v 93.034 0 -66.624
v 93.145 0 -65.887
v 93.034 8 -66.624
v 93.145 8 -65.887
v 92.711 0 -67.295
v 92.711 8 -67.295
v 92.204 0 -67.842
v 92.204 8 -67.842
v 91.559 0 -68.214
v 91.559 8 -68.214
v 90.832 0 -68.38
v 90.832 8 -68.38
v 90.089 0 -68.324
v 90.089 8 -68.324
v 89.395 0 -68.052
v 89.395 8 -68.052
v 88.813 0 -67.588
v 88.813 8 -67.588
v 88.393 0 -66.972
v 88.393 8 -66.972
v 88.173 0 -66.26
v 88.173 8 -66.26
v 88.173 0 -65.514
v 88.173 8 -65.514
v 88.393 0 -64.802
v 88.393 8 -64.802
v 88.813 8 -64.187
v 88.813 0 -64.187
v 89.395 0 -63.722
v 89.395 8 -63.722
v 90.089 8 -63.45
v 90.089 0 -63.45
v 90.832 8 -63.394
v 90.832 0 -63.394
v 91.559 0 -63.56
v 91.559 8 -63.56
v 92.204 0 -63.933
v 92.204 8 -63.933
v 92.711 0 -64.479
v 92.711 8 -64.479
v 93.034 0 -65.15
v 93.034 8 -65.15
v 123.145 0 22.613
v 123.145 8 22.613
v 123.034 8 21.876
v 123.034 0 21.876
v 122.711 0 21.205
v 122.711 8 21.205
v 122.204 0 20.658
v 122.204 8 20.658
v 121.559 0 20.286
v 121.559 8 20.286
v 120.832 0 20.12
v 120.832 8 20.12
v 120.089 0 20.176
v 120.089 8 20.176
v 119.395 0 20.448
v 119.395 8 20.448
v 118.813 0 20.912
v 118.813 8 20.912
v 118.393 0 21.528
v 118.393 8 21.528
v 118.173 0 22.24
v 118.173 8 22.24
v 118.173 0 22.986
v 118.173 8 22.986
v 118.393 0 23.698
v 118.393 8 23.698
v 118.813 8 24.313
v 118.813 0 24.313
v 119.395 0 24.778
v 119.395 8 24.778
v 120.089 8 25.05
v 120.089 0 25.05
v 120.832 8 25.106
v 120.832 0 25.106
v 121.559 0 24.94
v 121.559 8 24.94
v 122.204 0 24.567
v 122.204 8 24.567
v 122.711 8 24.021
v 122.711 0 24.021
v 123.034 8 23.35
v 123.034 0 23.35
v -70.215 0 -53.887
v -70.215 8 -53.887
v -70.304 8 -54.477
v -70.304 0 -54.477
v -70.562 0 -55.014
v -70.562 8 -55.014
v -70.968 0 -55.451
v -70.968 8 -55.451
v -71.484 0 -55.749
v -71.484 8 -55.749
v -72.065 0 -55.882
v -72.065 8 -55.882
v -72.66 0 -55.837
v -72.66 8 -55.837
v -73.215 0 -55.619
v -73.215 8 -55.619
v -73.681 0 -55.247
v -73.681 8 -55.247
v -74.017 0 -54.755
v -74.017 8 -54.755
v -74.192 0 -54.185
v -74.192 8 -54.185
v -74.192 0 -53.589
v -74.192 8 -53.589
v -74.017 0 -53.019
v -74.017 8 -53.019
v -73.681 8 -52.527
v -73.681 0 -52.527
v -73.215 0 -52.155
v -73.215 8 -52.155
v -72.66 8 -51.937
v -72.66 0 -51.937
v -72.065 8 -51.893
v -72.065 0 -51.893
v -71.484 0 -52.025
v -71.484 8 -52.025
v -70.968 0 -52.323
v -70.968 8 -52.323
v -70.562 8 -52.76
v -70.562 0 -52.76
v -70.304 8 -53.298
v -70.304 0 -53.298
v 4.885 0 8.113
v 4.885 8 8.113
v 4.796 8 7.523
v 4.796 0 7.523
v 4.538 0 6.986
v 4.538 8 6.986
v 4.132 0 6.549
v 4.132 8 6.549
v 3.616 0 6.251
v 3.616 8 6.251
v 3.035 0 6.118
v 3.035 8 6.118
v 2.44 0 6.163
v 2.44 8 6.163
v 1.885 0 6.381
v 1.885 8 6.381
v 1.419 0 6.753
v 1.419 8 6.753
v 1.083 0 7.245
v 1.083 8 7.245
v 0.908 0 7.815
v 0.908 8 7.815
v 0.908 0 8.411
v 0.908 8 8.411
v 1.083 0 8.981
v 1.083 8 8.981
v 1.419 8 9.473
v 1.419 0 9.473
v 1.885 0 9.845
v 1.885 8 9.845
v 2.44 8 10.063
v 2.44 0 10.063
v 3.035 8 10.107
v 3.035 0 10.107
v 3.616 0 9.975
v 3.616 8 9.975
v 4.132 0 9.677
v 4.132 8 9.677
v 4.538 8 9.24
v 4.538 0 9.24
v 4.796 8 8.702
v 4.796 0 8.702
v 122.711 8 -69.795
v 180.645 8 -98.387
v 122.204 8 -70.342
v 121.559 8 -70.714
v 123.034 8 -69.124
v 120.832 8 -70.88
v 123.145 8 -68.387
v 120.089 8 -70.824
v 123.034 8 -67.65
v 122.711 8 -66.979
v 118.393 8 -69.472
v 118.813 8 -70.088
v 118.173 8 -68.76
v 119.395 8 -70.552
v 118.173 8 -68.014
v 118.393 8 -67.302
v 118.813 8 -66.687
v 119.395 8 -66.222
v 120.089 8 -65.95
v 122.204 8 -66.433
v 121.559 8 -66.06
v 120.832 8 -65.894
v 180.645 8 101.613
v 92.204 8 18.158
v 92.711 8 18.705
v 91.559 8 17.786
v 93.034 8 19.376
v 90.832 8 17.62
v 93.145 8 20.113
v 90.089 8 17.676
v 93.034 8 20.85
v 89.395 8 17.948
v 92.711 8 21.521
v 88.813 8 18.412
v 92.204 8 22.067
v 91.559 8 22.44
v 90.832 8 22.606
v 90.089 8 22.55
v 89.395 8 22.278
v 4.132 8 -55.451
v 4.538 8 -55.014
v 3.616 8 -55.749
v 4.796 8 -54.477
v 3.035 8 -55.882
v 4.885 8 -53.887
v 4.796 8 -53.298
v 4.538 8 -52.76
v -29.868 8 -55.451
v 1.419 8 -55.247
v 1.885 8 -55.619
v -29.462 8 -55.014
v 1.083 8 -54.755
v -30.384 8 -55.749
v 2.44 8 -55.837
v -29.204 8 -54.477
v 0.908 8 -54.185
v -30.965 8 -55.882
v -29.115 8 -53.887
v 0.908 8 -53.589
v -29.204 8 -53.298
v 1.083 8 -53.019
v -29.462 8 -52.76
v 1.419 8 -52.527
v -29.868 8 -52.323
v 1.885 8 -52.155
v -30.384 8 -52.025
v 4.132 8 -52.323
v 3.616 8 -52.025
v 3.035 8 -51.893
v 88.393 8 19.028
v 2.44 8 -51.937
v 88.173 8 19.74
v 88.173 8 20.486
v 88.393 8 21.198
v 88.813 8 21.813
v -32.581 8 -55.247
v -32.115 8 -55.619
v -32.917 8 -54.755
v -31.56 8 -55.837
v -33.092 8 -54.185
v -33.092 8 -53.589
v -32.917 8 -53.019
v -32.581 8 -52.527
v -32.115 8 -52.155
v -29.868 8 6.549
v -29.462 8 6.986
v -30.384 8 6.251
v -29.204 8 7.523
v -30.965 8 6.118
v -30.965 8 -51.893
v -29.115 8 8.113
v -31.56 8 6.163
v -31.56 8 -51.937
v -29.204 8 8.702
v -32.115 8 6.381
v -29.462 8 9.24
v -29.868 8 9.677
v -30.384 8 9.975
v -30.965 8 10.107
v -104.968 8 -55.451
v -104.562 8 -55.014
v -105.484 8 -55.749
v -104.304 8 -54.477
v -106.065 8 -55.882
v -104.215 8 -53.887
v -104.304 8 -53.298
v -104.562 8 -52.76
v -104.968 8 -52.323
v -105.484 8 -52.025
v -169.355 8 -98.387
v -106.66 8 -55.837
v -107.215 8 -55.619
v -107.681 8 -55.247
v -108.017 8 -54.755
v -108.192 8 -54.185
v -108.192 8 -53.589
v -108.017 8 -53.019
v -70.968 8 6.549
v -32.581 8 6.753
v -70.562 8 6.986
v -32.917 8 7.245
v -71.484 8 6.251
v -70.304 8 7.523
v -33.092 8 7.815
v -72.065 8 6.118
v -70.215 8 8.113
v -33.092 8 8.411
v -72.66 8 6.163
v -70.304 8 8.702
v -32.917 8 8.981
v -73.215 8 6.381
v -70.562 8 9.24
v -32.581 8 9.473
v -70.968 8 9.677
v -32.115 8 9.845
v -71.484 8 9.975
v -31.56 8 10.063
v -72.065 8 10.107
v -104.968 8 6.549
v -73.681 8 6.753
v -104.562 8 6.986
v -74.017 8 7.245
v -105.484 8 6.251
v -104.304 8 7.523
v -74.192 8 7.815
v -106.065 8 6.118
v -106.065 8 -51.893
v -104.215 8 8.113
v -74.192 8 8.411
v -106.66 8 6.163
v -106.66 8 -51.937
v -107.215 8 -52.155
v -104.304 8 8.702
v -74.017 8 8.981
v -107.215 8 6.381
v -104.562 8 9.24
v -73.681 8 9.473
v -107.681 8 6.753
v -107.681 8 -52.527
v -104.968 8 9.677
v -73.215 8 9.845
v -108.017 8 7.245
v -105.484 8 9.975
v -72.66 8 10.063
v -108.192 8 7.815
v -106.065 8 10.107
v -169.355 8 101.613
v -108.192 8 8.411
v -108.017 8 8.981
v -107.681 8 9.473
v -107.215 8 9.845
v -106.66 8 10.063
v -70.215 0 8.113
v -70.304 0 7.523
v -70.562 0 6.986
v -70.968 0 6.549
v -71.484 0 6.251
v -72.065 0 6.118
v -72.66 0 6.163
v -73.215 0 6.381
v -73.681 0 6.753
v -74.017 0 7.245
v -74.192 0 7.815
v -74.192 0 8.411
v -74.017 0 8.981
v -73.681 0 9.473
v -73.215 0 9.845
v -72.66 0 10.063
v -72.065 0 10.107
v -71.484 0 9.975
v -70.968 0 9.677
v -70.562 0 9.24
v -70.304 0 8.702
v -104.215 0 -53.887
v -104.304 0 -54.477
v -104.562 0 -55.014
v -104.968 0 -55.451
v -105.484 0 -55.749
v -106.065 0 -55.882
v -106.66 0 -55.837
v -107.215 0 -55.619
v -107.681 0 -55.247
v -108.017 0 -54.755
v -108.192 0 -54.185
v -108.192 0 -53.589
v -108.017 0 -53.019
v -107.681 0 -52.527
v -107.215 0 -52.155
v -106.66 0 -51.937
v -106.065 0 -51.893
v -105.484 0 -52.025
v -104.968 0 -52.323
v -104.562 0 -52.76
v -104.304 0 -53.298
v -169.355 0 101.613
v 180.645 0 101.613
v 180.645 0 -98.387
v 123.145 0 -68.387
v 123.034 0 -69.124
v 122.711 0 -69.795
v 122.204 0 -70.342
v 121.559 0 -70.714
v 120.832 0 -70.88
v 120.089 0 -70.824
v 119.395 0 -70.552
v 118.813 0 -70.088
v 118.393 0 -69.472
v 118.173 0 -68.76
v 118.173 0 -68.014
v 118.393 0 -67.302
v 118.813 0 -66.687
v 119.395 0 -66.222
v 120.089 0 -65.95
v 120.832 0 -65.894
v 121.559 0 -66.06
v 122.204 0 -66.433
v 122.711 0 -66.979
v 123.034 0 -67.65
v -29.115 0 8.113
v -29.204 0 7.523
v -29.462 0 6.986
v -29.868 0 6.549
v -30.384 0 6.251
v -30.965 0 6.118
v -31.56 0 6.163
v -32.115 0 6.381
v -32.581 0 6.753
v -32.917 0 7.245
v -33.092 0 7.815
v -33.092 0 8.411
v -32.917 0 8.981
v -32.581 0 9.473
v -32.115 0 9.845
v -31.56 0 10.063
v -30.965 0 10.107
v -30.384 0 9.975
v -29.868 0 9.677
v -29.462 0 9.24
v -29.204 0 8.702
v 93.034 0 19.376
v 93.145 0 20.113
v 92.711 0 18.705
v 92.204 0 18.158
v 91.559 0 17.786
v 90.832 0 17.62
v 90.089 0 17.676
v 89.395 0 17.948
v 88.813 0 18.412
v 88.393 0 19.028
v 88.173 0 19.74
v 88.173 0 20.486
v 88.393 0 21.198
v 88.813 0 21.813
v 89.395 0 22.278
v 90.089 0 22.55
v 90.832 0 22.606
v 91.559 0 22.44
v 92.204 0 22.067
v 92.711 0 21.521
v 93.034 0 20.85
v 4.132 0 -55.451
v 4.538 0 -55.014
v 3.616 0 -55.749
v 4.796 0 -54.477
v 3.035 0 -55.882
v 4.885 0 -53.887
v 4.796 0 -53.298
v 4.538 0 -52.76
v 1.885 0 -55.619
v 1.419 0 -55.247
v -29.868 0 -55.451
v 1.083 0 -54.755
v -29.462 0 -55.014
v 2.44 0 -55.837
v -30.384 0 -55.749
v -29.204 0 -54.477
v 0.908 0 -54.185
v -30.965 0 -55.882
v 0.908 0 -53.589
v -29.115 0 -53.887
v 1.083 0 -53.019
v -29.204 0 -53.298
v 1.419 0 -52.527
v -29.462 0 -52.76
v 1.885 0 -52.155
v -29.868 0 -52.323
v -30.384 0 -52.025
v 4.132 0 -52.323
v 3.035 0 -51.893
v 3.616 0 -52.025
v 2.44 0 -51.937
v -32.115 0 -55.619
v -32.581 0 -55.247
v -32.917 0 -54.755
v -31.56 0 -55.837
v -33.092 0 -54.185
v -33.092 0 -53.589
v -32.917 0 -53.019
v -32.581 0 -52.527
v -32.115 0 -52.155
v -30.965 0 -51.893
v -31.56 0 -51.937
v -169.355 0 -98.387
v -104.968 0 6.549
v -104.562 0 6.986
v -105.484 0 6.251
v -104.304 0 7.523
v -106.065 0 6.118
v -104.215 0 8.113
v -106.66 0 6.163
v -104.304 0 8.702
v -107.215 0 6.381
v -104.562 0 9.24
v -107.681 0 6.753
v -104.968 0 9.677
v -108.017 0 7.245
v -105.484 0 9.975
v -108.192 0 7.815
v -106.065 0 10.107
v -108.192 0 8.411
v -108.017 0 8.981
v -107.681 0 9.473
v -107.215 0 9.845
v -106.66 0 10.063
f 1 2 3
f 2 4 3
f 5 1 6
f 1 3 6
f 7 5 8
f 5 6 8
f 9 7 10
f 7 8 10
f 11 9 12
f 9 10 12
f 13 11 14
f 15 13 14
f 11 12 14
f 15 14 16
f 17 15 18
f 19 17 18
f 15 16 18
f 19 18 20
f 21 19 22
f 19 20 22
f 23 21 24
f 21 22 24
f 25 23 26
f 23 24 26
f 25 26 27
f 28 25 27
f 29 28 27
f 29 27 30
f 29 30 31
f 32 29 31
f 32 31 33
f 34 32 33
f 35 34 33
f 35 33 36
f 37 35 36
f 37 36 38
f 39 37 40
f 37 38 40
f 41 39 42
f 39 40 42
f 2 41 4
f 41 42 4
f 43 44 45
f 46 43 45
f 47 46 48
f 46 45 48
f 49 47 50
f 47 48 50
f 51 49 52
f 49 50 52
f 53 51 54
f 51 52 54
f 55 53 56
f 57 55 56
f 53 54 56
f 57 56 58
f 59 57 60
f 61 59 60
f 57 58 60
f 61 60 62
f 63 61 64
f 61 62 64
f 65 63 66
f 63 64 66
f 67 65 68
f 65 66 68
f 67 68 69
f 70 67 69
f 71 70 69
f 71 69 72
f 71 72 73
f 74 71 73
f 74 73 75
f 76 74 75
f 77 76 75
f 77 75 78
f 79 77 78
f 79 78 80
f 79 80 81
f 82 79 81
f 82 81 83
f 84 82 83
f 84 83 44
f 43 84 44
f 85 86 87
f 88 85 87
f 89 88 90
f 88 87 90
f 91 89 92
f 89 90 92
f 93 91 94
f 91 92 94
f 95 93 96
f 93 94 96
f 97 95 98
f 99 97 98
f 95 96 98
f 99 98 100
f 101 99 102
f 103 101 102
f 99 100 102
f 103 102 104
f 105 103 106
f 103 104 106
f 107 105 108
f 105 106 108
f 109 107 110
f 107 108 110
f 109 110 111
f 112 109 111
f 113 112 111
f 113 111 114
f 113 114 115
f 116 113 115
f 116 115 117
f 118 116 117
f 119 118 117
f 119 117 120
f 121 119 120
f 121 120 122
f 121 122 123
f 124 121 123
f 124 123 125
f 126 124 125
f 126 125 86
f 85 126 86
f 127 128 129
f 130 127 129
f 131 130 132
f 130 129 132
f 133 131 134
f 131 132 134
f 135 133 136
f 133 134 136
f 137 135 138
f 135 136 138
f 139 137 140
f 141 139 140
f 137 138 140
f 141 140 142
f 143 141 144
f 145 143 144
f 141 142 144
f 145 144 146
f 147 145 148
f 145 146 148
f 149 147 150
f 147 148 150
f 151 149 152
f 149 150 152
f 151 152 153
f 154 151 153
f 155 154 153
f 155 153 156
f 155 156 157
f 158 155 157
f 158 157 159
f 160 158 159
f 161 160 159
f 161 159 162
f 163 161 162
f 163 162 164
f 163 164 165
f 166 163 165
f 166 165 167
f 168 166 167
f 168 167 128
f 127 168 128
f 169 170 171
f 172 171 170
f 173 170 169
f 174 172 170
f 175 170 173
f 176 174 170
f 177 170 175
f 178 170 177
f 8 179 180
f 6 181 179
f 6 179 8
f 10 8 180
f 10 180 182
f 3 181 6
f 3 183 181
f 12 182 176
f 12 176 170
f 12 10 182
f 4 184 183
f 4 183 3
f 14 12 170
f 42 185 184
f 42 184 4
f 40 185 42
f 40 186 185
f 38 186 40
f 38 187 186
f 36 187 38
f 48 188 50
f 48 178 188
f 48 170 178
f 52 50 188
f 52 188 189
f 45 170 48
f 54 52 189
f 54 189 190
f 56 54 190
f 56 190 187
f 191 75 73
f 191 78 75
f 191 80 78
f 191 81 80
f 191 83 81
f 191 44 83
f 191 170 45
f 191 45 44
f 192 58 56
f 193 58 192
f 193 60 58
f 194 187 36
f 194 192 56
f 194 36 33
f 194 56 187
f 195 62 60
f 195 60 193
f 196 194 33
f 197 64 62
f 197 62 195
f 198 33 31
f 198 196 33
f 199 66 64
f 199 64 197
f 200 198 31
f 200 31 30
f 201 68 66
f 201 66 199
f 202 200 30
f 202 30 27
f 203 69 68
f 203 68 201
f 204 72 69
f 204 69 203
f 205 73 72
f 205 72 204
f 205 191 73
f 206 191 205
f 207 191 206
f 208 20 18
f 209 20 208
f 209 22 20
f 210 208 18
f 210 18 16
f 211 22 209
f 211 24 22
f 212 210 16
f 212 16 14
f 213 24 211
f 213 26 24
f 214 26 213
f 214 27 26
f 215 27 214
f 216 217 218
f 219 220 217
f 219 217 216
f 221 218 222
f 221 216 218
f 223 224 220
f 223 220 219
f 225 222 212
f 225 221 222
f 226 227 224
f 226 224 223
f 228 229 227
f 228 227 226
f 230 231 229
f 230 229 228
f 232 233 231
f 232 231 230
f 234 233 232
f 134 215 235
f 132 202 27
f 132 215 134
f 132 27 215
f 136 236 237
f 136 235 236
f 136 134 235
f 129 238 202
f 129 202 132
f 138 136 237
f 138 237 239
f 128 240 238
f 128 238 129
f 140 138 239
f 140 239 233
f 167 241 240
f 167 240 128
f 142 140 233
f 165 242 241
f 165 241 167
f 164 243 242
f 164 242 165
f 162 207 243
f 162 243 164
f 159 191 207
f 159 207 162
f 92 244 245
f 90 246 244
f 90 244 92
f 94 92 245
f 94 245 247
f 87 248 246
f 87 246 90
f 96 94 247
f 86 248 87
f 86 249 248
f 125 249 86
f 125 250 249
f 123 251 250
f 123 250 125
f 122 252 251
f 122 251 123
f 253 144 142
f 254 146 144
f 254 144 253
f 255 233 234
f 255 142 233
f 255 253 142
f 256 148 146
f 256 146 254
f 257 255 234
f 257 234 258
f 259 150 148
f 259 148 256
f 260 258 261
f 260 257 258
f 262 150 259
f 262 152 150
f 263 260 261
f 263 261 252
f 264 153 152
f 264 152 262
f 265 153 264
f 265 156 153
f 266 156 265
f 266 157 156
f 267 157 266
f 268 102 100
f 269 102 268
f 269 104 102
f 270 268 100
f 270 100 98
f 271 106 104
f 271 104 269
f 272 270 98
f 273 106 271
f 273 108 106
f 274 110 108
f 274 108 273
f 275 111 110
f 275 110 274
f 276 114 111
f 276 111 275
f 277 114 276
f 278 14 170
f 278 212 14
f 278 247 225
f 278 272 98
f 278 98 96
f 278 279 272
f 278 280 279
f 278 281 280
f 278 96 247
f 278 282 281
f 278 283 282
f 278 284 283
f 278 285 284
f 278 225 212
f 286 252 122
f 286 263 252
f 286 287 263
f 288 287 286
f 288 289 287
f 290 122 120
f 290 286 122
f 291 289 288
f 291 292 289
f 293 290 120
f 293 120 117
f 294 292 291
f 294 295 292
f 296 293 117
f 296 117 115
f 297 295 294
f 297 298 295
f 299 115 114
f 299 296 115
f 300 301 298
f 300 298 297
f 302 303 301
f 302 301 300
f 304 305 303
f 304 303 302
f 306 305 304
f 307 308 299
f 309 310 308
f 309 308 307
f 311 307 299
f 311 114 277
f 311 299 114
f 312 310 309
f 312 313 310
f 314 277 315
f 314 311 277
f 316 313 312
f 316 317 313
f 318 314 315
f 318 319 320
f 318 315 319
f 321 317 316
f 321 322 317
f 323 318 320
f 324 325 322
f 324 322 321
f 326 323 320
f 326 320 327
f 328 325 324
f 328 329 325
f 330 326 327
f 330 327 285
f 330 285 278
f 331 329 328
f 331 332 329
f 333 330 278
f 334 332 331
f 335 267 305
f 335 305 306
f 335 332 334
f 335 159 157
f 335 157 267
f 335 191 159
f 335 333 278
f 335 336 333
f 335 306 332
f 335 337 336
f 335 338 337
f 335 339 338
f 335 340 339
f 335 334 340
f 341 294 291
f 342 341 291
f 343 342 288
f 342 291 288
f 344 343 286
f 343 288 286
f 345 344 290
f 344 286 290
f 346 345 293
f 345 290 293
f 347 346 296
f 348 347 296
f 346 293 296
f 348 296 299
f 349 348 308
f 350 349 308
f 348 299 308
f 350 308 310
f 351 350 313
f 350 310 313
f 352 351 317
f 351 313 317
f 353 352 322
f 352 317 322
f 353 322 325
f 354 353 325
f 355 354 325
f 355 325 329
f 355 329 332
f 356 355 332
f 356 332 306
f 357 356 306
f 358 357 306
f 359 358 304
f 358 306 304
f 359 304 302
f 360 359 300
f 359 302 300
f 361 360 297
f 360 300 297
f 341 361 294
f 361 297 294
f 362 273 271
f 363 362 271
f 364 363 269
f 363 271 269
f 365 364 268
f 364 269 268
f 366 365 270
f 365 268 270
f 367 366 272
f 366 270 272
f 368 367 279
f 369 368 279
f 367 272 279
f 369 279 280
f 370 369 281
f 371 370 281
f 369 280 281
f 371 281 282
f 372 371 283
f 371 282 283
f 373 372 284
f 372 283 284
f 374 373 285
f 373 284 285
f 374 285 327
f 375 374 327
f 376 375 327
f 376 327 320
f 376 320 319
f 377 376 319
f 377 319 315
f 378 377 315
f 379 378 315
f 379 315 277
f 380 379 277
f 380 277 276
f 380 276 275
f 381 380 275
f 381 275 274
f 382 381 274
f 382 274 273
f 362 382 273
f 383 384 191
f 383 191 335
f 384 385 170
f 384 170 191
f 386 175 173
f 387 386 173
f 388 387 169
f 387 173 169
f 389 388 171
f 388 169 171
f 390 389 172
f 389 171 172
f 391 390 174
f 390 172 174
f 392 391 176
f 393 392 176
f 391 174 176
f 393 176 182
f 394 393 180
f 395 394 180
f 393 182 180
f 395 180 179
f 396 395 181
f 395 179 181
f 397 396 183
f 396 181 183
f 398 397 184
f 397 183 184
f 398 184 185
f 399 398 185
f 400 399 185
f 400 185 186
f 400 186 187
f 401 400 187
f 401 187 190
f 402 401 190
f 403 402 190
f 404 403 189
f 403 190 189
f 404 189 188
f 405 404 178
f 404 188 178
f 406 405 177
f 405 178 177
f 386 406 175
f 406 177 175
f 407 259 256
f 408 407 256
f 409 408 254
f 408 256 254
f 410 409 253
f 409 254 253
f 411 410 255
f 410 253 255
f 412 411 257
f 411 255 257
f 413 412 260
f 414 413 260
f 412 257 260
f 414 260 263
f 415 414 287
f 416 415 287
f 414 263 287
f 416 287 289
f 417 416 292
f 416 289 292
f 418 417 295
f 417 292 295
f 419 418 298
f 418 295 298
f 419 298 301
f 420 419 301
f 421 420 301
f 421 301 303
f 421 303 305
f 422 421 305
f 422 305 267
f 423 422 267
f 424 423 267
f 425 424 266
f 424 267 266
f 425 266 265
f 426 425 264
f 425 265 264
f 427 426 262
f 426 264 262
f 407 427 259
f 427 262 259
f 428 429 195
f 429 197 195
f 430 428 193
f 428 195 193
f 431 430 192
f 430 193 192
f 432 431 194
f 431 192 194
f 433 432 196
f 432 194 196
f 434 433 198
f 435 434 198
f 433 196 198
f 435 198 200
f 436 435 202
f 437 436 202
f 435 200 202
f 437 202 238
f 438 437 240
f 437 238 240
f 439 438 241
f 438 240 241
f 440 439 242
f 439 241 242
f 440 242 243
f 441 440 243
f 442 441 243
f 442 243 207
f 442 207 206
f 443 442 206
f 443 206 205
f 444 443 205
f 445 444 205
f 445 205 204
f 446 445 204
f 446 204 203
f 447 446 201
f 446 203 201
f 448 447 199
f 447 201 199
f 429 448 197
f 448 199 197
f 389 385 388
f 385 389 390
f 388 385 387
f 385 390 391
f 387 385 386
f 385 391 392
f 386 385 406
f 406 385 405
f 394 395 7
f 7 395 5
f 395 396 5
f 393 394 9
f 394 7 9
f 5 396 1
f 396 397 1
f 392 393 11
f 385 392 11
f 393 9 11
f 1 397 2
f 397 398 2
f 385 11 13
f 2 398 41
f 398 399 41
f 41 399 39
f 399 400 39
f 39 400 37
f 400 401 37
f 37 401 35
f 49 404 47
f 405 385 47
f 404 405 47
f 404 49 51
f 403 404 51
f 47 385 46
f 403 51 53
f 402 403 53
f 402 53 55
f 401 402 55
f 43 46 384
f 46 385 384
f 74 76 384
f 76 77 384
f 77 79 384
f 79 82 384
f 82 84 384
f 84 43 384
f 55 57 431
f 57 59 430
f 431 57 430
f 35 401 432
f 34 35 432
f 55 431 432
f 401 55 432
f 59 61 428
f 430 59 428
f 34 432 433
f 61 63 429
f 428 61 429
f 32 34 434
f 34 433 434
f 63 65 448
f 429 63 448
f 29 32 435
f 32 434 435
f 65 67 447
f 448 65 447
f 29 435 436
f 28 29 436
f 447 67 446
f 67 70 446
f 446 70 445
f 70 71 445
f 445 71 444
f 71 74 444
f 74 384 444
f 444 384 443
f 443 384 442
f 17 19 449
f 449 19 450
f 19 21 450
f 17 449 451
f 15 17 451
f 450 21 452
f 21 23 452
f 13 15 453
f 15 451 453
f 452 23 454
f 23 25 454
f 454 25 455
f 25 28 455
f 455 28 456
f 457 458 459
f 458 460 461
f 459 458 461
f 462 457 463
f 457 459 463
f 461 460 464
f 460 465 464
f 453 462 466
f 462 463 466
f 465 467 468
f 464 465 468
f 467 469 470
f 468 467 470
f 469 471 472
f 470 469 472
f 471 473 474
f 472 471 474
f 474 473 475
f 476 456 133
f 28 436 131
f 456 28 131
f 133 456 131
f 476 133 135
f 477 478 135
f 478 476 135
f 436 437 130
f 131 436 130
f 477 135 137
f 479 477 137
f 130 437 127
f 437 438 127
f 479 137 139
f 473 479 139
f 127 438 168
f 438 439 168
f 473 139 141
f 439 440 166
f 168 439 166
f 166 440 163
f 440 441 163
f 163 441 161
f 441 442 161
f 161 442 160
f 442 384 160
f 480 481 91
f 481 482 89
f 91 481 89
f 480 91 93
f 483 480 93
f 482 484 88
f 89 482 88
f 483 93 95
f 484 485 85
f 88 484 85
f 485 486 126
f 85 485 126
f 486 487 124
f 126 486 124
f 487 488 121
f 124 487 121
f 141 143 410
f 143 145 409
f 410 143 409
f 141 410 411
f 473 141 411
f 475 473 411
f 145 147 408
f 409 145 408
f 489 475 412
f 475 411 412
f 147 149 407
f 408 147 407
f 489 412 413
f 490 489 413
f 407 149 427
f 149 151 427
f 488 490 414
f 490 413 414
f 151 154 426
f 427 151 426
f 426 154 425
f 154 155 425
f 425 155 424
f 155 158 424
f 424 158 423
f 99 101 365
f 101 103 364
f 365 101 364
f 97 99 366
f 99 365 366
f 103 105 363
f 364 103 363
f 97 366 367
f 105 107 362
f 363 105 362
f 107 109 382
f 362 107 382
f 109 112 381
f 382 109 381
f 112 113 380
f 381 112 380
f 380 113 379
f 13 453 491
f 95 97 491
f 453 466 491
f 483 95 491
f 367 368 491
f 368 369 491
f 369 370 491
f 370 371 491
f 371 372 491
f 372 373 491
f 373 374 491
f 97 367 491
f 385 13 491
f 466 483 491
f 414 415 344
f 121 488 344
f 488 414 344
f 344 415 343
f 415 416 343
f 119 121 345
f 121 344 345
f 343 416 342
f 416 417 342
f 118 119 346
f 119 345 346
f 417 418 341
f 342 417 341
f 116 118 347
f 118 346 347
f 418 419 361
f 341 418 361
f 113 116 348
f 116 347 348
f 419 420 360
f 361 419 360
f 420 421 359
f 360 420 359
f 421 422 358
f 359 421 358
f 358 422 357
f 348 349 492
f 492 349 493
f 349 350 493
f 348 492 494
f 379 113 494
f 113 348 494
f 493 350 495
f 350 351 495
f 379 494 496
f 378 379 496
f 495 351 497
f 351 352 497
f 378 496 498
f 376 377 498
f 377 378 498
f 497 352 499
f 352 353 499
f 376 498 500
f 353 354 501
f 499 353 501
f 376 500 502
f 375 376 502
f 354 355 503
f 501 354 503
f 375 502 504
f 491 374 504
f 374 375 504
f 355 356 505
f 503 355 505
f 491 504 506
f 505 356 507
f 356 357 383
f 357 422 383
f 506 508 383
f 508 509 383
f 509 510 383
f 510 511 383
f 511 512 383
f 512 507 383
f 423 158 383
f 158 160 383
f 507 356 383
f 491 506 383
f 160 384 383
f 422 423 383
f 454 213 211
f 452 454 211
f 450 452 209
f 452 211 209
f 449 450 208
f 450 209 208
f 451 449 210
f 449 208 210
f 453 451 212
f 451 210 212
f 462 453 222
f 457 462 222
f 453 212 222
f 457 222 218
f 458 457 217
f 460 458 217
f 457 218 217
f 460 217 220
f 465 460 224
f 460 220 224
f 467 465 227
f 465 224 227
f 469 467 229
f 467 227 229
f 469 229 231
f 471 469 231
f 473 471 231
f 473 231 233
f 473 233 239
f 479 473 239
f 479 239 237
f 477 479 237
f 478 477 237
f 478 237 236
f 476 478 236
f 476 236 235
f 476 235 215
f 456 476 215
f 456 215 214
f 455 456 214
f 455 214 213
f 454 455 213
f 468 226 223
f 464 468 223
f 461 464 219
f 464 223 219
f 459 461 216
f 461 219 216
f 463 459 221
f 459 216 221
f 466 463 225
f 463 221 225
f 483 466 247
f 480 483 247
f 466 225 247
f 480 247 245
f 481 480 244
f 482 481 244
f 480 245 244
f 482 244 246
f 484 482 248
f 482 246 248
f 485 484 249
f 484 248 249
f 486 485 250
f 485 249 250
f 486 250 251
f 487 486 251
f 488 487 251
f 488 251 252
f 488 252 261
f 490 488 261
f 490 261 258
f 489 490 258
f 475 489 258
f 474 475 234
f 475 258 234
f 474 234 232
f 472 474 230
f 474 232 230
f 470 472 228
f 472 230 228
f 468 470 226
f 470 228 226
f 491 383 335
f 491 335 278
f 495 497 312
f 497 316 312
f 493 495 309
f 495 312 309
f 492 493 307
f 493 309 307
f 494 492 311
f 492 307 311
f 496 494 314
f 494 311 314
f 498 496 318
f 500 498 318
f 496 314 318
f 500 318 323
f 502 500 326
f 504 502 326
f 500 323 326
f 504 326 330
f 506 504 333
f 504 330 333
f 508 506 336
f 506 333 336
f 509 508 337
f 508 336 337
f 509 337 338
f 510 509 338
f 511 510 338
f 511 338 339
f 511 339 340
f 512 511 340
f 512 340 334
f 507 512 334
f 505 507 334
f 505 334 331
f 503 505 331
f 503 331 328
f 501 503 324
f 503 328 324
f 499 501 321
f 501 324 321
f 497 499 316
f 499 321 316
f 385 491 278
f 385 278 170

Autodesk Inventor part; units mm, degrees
ref_plane "YZ Plane" through (0, 0, 0) normal (1, 0, 0) x (0, 1, 0)
ref_plane "XZ Plane" through (0, 0, 0) normal (0, 1, 0) x (-1, 0, 0)
ref_plane "XY Plane" through (0, 0, 0) normal (0, 0, 1) x (1, 0, 0)
sketch "Esquisse1" plane through (0, 0, 0) normal (0, 1, 0) x (-1, 0, 0)
  line L0 (-180.6452, 101.6129) -> (169.3548, 101.6129)
  line L1 (169.3548, 101.6129) -> (169.3548, -98.3871)
  line L2 (169.3548, -98.3871) -> (-180.6452, -98.3871)
  line L3 (-180.6452, -98.3871) -> (-180.6452, 101.6129)
  point P0 (0, 0)
  dimension "d0" = 350
  dimension "d1" = 200
extrude "Extrusion1" add sketch "Esquisse1" along normal blind 8
sketch "Esquisse2" plane through (0, 8, 0) normal (0, 1, 0) x (1, 0, 0)
  line L0 (180.6452, -101.6129) -> (180.6452, 98.3871) projected
  line L1 (180.6452, 98.3871) -> (-169.3548, 98.3871) projected
  circle A0 centre (120.6452, 68.3871) radius 2.5
  circle A1 centre (90.6452, 65.8871) radius 2.5
  circle A2 centre (120.6452, -22.6129) radius 2.5
  circle A3 centre (90.6452, -20.1129) radius 2.5
  point P0 (0, 0)
  dimension "d4" = 5
  dimension "d5" = 5
  dimension "d6" = 5
  dimension "d7" = 5
  dimension "d8" = 86
  dimension "d9" = 91
  dimension "d10" = 30
  dimension "d11" = 2.5
  dimension "d12" = 30
  dimension "d13" = 30
  dimension "d14" = 60
  dimension "d15" = 60
extrude "Extrusion2" cut sketch "Esquisse2" against normal through all
sketch "Esquisse3" plane through (0, 8, 0) normal (0, 1, 0) x (1, 0, 0)
  circle A0 centre (90.6452, 65.8871) radius 2.5 projected
  circle A1 centre (90.6452, -20.1129) radius 2.5 projected
  line L0 (180.6452, 98.3871) -> (-169.3548, 98.3871) projected
  circle A2 centre (2.8852, 53.8871) radius 2
  circle A3 centre (-31.1148, 53.8871) radius 2
  circle A4 centre (-72.2148, 53.8871) radius 2
  circle A5 centre (-106.2148, 53.8871) radius 2
  circle A6 centre (-106.2148, -8.1129) radius 2
  circle A7 centre (-72.2148, -8.1129) radius 2
  circle A8 centre (-31.1148, -8.1129) radius 2
  circle A9 centre (2.8852, -8.1129) radius 2
  point P0 (0, 0)
  dimension "d18" = 4
  dimension "d19" = 4
  dimension "d20" = 4
  dimension "d21" = 4
  dimension "d22" = 4
  dimension "d23" = 4
  dimension "d24" = 4
  dimension "d25" = 4
  dimension "d26" = 62
  dimension "d27" = 62
  dimension "d28" = 62
  dimension "d29" = 62
  dimension "d30" = 34
  dimension "d31" = 34
  dimension "d32" = 34
  dimension "d33" = 34
  dimension "d34" = 41.1
  dimension "d35" = 41.1
  dimension "d36" = 87.76
  dimension "d37" = 87.76
  dimension "d38" = 32.5
  dimension "d39" = 86
  dimension "d40" = 44.5
  dimension "d41" = 44.5
  dimension "d42" = 44.5
  dimension "d43" = 44.5
extrude "Extrusion3" cut sketch "Esquisse3" against normal through all contours A2 | A3 | A4 | A5 | A6 | A7 | A8 | A9
equation "\"d5\" = d4"
equation "\"d6\" = d4"
equation "\"d7\" = d4"
equation "\"d12\" = d10"
equation "\"d15\" = d14"
equation "\"d19\" = d18"
equation "\"d20\" = d18"
equation "\"d21\" = d18"
equation "\"d22\" = d18"
equation "\"d23\" = d18"
equation "\"d24\" = d18"
equation "\"d25\" = d18"
equation "\"d27\" = d26"
equation "\"d28\" = d26"
equation "\"d29\" = d26"
equation "\"d31\" = d30"
equation "\"d33\" = d32"
equation "\"d35\" = d34"
equation "\"d37\" = d36"
equation "\"d40\" = d38 + 0.5 * d39 - 0.5 * d26"
equation "\"d41\" = d40"
equation "\"d42\" = d40"
equation "\"d43\" = d40"
properties part number "Base" material "PVC, non plastifié"
